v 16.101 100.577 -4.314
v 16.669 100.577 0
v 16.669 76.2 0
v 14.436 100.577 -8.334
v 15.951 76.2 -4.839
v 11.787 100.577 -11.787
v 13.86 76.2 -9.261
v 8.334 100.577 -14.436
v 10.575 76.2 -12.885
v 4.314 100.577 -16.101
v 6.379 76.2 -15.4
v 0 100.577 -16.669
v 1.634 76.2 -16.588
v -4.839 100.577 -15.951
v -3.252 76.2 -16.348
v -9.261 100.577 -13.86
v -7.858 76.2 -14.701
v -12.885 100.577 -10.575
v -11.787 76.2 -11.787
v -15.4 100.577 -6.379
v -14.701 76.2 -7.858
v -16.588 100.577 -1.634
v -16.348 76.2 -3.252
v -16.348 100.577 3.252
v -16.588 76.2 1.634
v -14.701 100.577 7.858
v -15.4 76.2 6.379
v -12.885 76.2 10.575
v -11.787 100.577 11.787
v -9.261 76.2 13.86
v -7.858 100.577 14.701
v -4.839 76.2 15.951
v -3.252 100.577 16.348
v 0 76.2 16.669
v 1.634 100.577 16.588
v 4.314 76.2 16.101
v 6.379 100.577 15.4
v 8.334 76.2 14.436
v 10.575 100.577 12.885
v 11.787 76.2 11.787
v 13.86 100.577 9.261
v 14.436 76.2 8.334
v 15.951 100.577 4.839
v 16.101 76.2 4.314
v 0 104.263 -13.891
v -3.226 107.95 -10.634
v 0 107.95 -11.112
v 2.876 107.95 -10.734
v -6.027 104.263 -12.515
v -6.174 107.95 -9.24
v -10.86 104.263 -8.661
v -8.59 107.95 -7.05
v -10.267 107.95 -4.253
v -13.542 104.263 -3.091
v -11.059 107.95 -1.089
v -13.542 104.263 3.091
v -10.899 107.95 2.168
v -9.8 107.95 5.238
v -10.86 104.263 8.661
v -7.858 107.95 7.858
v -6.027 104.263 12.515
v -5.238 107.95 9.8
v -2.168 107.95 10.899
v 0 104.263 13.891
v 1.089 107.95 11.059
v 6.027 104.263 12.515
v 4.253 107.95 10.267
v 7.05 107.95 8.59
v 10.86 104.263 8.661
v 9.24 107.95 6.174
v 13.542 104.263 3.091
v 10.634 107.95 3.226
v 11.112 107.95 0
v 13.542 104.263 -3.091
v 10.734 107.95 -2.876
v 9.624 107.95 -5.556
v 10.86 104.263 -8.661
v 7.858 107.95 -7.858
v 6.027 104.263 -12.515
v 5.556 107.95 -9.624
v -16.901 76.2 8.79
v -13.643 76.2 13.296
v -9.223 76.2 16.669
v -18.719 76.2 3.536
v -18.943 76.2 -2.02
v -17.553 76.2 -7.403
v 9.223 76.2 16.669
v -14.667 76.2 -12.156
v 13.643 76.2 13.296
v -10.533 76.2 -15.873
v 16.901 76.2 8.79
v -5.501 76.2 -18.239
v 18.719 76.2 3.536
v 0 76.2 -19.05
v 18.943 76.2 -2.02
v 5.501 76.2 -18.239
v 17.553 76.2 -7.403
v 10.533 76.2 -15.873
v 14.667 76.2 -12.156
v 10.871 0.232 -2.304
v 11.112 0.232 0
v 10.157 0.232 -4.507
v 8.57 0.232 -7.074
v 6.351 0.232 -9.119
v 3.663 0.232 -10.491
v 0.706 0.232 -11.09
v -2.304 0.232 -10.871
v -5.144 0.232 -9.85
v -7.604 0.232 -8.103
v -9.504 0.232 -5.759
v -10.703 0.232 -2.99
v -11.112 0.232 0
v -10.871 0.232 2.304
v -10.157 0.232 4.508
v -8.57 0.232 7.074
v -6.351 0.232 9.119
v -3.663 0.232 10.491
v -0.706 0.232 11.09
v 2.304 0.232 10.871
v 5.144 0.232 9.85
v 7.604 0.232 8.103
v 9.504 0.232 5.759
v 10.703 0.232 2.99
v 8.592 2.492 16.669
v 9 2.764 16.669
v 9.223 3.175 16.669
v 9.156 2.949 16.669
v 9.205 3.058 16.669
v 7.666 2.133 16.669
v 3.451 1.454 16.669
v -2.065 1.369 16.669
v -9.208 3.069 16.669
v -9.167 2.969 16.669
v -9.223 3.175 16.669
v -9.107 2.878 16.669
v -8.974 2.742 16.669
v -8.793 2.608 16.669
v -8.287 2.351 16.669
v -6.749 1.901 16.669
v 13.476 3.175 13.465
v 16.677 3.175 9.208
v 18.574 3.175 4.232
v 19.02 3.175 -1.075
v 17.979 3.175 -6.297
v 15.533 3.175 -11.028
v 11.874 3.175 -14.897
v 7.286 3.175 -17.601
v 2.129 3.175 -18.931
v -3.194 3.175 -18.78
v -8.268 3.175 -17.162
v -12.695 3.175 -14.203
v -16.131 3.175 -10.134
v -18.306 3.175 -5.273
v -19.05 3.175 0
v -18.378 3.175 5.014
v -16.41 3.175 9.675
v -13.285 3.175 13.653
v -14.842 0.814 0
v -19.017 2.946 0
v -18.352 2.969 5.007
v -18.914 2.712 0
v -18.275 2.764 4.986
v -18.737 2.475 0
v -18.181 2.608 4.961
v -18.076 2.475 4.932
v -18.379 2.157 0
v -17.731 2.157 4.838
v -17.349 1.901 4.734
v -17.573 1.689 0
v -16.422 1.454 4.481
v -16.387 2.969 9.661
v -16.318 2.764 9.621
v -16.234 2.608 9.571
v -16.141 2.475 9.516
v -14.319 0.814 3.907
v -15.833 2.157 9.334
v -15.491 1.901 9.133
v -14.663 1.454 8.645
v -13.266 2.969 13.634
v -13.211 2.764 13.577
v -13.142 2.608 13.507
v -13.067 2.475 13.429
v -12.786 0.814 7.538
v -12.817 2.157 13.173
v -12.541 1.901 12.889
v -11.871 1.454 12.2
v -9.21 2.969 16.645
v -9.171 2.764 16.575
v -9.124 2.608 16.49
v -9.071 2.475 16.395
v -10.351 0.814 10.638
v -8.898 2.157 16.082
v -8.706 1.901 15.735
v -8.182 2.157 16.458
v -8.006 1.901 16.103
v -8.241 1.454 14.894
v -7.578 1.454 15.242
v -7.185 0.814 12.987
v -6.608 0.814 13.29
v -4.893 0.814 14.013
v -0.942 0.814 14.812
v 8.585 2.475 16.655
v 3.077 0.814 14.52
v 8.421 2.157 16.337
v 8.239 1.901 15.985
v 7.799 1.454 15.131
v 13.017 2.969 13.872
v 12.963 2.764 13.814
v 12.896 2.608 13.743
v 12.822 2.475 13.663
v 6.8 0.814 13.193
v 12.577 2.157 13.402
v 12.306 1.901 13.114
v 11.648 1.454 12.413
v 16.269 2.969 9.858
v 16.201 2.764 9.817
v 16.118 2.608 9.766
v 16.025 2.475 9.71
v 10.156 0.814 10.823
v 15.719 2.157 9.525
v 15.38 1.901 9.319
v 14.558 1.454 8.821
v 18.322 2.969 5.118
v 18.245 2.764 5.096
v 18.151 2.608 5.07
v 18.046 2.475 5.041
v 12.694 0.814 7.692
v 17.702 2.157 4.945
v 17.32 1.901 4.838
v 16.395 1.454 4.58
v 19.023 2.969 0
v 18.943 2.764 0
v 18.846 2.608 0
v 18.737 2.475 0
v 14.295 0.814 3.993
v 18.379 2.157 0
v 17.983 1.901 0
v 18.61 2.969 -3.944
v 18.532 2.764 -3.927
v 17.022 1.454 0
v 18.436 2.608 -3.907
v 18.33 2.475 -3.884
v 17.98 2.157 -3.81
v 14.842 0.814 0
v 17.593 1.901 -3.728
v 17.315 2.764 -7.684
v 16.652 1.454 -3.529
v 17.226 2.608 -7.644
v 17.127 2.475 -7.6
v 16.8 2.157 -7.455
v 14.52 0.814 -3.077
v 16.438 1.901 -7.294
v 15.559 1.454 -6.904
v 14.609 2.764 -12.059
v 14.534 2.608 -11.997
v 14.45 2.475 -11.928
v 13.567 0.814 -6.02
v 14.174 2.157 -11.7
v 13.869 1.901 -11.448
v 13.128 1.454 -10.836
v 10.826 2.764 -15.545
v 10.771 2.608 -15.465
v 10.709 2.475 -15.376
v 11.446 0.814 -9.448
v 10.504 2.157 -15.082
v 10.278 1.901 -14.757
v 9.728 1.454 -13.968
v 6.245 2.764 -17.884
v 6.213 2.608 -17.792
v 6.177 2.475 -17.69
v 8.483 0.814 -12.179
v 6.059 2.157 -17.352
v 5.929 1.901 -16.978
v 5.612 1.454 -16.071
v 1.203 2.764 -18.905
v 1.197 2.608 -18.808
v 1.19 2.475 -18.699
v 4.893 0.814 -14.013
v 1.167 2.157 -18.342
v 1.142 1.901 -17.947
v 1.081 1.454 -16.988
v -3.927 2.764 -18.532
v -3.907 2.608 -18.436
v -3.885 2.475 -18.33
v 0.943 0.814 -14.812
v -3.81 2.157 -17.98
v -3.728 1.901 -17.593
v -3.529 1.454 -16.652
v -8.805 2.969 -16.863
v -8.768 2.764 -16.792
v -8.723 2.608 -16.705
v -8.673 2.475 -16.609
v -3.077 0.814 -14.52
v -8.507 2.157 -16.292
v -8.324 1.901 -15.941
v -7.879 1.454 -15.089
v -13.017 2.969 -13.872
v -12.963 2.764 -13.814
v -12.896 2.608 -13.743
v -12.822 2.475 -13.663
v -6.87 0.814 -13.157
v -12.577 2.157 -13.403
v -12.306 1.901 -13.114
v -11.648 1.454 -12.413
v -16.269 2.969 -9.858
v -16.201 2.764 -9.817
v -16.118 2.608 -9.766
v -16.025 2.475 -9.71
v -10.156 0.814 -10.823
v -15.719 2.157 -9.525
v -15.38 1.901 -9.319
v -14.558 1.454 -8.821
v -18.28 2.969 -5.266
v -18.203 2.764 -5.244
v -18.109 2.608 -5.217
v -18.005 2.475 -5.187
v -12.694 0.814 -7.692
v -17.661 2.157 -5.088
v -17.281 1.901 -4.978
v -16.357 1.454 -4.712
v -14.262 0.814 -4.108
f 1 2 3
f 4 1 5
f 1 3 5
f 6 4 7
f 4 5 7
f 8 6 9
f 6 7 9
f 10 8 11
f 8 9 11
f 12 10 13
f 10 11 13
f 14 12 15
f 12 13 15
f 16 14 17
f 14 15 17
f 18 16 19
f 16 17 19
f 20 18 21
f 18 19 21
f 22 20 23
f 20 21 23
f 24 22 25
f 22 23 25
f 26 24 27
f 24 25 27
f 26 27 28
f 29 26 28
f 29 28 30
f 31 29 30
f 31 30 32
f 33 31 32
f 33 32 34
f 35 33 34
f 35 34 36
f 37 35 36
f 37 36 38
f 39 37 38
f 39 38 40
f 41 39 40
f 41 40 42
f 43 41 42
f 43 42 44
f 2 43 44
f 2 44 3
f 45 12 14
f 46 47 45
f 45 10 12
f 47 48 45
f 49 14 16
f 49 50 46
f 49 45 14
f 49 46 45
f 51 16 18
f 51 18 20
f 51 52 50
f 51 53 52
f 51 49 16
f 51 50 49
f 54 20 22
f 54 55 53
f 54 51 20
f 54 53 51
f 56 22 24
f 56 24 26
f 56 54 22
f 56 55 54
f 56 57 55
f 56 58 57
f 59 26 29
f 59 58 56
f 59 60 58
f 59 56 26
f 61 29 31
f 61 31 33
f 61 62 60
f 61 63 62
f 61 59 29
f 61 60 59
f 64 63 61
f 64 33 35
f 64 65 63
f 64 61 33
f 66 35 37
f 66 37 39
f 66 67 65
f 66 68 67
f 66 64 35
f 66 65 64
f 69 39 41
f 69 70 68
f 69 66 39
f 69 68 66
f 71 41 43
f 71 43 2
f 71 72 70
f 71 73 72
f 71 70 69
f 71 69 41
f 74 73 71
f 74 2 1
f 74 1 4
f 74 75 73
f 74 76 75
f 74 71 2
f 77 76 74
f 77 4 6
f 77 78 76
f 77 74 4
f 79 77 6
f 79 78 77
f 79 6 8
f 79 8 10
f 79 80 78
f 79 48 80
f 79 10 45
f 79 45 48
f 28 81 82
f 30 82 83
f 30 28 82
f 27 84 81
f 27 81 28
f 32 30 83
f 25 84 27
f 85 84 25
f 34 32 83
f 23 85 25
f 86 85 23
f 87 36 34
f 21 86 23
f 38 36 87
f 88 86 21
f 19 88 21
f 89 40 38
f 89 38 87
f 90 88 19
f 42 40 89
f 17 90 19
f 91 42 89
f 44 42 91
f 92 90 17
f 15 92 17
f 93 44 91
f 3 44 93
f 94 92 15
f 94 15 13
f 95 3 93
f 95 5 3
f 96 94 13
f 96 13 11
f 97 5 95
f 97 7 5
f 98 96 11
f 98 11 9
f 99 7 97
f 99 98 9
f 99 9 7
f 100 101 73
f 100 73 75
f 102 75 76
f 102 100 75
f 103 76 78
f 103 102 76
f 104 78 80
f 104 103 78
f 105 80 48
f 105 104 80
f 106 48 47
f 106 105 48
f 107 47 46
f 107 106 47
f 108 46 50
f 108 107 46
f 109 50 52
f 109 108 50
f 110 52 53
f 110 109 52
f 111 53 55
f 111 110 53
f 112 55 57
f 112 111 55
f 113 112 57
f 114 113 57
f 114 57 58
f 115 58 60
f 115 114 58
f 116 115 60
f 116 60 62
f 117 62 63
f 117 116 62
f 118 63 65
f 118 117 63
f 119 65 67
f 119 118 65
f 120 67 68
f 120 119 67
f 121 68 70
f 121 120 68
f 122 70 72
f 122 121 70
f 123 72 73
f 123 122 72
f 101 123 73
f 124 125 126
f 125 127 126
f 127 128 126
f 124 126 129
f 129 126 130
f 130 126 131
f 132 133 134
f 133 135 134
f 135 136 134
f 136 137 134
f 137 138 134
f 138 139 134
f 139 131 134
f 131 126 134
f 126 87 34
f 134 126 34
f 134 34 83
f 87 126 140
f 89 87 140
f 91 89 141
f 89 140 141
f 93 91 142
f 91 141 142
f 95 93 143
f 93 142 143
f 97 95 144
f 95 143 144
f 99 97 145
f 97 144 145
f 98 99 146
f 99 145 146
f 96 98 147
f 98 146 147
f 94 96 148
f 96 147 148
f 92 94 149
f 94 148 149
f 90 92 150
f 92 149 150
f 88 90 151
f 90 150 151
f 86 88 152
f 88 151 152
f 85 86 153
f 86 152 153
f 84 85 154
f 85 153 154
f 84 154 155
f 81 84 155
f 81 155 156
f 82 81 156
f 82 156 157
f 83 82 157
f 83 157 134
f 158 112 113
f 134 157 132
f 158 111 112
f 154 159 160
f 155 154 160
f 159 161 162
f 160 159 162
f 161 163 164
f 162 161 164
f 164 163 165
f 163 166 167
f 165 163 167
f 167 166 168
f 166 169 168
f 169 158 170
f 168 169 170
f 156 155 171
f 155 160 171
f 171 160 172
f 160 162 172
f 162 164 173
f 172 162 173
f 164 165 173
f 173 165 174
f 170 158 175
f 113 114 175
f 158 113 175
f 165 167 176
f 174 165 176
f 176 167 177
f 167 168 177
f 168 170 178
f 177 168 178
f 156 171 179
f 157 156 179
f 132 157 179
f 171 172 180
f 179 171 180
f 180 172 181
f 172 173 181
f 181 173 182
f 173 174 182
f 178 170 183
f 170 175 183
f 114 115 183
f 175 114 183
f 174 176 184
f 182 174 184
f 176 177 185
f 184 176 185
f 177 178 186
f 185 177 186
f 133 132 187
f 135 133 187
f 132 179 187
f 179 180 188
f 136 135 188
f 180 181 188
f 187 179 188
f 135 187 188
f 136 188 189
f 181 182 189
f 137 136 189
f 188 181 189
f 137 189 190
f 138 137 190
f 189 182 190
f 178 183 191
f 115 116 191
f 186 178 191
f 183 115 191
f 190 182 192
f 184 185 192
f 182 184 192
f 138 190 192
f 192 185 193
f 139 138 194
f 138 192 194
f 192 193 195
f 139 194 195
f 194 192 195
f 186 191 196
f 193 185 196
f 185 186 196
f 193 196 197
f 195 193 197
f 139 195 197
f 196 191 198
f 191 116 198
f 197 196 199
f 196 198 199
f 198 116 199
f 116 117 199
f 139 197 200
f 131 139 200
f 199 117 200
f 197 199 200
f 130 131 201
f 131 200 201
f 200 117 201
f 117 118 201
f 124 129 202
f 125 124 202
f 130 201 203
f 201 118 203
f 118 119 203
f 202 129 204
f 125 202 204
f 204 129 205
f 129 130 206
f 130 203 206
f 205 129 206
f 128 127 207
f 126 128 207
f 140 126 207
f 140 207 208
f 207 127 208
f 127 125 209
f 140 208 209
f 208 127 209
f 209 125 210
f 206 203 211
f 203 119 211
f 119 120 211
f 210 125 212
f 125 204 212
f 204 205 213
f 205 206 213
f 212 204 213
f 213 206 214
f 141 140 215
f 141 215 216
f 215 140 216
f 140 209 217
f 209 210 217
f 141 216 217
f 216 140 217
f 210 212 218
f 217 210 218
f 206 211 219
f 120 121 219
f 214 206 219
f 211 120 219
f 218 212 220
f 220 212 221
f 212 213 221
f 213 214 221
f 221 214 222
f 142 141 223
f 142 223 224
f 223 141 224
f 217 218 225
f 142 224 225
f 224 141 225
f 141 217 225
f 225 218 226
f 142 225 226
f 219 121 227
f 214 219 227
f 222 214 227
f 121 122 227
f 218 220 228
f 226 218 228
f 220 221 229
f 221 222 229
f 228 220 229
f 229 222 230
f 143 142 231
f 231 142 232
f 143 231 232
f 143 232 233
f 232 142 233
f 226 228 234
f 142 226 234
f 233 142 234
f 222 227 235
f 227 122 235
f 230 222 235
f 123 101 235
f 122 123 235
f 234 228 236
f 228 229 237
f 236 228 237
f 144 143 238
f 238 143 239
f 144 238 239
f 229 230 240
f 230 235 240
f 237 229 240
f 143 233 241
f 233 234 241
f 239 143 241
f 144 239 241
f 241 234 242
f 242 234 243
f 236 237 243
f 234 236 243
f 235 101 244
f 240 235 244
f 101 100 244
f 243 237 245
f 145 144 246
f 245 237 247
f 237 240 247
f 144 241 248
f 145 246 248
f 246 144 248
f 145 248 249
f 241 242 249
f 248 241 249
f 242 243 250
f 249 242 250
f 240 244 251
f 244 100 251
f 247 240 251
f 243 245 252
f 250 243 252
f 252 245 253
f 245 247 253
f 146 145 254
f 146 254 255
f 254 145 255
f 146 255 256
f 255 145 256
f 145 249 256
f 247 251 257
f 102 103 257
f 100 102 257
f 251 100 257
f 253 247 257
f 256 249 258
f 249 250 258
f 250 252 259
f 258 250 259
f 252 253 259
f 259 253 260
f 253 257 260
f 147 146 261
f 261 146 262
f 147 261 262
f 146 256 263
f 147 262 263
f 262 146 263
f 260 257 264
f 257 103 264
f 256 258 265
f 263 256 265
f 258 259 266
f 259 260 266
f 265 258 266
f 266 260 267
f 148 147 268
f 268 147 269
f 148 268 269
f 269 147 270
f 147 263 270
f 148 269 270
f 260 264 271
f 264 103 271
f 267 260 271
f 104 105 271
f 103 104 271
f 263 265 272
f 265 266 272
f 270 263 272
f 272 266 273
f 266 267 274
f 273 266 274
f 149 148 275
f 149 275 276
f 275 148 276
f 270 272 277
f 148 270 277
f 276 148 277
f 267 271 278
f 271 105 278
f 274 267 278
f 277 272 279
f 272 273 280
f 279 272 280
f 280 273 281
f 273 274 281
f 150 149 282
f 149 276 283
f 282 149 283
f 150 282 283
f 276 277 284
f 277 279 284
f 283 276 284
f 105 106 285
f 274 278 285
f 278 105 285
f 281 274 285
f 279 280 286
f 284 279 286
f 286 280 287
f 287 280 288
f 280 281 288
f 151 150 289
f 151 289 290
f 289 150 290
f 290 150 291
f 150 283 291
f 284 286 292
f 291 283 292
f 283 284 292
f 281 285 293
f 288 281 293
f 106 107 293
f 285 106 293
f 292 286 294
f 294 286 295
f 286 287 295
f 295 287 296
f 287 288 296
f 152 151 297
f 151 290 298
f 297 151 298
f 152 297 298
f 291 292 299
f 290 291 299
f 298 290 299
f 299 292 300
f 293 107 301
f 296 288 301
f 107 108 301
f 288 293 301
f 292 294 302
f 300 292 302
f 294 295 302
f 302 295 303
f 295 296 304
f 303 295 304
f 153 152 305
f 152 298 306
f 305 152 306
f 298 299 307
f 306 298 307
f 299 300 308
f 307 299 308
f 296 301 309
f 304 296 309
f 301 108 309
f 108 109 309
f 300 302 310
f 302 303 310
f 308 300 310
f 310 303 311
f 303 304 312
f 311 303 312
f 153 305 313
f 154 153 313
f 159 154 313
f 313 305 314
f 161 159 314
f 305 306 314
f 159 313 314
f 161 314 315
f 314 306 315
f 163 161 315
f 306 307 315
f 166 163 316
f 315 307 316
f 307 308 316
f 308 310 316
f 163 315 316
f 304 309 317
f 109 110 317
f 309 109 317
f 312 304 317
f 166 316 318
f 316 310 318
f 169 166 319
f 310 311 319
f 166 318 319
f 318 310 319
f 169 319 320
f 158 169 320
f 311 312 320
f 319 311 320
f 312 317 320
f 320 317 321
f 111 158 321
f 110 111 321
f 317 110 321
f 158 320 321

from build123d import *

# Parameters (mm, degrees)
SKETCH1_R           = 19.05
SKETCH1_R_2         = 11.1125
BOSS_EXTRUDE1_DEPTH = 76.2
SKETCH2_R           = 16.66875
SKETCH2_R_2         = 11.1125
BOSS_EXTRUDE2_DEPTH = 31.75
CUT_EXTRUDE1_DEPTH  = 77.2


with BuildPart() as part:
    # Sketch1 → Boss-Extrude1 (new body)
    with BuildSketch(Plane(origin=(0, 0, 0), x_dir=(1, 0, 0), z_dir=(0, 1, 0))):
        Circle(SKETCH1_R)
        Circle(SKETCH1_R_2, mode=Mode.SUBTRACT)
    extrude(amount=BOSS_EXTRUDE1_DEPTH)

    # Sketch2 → Boss-Extrude2 (add)
    with BuildSketch(Plane(origin=(0, 76.2, 0), x_dir=(1, 0, 0), z_dir=(0, 1, 0))):
        Circle(SKETCH2_R)
        Circle(SKETCH2_R_2, mode=Mode.SUBTRACT)
    extrude(amount=BOSS_EXTRUDE2_DEPTH)

    # Sketch3 → Cut-Revolve1 (revolve, cut)
    with BuildSketch(Plane(origin=(0, 0, 0), x_dir=(0, 0, -1), z_dir=(1, 0, 0))):
        Polygon((16.66875, 107.95), (16.66875, 100.57660721), (11.1125, 107.95), align=None)
    revolve(axis=Axis((0, 107.95, 0), (0, 1, 0)), mode=Mode.SUBTRACT)

    # Sketch4 → Cut-Extrude1 (cut, through all)
    with BuildSketch(Plane(origin=(0, 76.2, 0), x_dir=(1, 0, 0), z_dir=(0, 1, 0))):
        with BuildLine():
            Line((24.271104702, -16.66875), (-24.271104702, -16.66875))
            ThreePointArc((-24.271104702, -16.66875), (0, -29.443738723), (24.271104702, -16.66875))
        make_face()
    extrude(amount=-CUT_EXTRUDE1_DEPTH, mode=Mode.SUBTRACT)

    # Sketch8 → Cut-Revolve4 (revolve, cut)
    with BuildSketch(Plane.XY):
        with BuildLine():
            Line((0, 0), (-6.35, 0))
            add(Edge.make_bspline(
                [(-19.05, 3.175), (-19.05, 0), (-6.35, 0)],
                knots=[3.141592654, 3.141592654, 3.141592654, 4.71238898, 4.71238898, 4.71238898], degree=2, weights=[1, 0.707106781, 1]))
            Line((-19.05, 3.175), (-19.05, -4.469484217))
            Line((-19.05, -4.469484217), (0, -4.469484217))
            Line((0, -4.469484217), (0, 0))
        make_face()
    revolve(axis=Axis((0, 0, 0), (0, 1, 0)), mode=Mode.SUBTRACT)


solid = part.part
